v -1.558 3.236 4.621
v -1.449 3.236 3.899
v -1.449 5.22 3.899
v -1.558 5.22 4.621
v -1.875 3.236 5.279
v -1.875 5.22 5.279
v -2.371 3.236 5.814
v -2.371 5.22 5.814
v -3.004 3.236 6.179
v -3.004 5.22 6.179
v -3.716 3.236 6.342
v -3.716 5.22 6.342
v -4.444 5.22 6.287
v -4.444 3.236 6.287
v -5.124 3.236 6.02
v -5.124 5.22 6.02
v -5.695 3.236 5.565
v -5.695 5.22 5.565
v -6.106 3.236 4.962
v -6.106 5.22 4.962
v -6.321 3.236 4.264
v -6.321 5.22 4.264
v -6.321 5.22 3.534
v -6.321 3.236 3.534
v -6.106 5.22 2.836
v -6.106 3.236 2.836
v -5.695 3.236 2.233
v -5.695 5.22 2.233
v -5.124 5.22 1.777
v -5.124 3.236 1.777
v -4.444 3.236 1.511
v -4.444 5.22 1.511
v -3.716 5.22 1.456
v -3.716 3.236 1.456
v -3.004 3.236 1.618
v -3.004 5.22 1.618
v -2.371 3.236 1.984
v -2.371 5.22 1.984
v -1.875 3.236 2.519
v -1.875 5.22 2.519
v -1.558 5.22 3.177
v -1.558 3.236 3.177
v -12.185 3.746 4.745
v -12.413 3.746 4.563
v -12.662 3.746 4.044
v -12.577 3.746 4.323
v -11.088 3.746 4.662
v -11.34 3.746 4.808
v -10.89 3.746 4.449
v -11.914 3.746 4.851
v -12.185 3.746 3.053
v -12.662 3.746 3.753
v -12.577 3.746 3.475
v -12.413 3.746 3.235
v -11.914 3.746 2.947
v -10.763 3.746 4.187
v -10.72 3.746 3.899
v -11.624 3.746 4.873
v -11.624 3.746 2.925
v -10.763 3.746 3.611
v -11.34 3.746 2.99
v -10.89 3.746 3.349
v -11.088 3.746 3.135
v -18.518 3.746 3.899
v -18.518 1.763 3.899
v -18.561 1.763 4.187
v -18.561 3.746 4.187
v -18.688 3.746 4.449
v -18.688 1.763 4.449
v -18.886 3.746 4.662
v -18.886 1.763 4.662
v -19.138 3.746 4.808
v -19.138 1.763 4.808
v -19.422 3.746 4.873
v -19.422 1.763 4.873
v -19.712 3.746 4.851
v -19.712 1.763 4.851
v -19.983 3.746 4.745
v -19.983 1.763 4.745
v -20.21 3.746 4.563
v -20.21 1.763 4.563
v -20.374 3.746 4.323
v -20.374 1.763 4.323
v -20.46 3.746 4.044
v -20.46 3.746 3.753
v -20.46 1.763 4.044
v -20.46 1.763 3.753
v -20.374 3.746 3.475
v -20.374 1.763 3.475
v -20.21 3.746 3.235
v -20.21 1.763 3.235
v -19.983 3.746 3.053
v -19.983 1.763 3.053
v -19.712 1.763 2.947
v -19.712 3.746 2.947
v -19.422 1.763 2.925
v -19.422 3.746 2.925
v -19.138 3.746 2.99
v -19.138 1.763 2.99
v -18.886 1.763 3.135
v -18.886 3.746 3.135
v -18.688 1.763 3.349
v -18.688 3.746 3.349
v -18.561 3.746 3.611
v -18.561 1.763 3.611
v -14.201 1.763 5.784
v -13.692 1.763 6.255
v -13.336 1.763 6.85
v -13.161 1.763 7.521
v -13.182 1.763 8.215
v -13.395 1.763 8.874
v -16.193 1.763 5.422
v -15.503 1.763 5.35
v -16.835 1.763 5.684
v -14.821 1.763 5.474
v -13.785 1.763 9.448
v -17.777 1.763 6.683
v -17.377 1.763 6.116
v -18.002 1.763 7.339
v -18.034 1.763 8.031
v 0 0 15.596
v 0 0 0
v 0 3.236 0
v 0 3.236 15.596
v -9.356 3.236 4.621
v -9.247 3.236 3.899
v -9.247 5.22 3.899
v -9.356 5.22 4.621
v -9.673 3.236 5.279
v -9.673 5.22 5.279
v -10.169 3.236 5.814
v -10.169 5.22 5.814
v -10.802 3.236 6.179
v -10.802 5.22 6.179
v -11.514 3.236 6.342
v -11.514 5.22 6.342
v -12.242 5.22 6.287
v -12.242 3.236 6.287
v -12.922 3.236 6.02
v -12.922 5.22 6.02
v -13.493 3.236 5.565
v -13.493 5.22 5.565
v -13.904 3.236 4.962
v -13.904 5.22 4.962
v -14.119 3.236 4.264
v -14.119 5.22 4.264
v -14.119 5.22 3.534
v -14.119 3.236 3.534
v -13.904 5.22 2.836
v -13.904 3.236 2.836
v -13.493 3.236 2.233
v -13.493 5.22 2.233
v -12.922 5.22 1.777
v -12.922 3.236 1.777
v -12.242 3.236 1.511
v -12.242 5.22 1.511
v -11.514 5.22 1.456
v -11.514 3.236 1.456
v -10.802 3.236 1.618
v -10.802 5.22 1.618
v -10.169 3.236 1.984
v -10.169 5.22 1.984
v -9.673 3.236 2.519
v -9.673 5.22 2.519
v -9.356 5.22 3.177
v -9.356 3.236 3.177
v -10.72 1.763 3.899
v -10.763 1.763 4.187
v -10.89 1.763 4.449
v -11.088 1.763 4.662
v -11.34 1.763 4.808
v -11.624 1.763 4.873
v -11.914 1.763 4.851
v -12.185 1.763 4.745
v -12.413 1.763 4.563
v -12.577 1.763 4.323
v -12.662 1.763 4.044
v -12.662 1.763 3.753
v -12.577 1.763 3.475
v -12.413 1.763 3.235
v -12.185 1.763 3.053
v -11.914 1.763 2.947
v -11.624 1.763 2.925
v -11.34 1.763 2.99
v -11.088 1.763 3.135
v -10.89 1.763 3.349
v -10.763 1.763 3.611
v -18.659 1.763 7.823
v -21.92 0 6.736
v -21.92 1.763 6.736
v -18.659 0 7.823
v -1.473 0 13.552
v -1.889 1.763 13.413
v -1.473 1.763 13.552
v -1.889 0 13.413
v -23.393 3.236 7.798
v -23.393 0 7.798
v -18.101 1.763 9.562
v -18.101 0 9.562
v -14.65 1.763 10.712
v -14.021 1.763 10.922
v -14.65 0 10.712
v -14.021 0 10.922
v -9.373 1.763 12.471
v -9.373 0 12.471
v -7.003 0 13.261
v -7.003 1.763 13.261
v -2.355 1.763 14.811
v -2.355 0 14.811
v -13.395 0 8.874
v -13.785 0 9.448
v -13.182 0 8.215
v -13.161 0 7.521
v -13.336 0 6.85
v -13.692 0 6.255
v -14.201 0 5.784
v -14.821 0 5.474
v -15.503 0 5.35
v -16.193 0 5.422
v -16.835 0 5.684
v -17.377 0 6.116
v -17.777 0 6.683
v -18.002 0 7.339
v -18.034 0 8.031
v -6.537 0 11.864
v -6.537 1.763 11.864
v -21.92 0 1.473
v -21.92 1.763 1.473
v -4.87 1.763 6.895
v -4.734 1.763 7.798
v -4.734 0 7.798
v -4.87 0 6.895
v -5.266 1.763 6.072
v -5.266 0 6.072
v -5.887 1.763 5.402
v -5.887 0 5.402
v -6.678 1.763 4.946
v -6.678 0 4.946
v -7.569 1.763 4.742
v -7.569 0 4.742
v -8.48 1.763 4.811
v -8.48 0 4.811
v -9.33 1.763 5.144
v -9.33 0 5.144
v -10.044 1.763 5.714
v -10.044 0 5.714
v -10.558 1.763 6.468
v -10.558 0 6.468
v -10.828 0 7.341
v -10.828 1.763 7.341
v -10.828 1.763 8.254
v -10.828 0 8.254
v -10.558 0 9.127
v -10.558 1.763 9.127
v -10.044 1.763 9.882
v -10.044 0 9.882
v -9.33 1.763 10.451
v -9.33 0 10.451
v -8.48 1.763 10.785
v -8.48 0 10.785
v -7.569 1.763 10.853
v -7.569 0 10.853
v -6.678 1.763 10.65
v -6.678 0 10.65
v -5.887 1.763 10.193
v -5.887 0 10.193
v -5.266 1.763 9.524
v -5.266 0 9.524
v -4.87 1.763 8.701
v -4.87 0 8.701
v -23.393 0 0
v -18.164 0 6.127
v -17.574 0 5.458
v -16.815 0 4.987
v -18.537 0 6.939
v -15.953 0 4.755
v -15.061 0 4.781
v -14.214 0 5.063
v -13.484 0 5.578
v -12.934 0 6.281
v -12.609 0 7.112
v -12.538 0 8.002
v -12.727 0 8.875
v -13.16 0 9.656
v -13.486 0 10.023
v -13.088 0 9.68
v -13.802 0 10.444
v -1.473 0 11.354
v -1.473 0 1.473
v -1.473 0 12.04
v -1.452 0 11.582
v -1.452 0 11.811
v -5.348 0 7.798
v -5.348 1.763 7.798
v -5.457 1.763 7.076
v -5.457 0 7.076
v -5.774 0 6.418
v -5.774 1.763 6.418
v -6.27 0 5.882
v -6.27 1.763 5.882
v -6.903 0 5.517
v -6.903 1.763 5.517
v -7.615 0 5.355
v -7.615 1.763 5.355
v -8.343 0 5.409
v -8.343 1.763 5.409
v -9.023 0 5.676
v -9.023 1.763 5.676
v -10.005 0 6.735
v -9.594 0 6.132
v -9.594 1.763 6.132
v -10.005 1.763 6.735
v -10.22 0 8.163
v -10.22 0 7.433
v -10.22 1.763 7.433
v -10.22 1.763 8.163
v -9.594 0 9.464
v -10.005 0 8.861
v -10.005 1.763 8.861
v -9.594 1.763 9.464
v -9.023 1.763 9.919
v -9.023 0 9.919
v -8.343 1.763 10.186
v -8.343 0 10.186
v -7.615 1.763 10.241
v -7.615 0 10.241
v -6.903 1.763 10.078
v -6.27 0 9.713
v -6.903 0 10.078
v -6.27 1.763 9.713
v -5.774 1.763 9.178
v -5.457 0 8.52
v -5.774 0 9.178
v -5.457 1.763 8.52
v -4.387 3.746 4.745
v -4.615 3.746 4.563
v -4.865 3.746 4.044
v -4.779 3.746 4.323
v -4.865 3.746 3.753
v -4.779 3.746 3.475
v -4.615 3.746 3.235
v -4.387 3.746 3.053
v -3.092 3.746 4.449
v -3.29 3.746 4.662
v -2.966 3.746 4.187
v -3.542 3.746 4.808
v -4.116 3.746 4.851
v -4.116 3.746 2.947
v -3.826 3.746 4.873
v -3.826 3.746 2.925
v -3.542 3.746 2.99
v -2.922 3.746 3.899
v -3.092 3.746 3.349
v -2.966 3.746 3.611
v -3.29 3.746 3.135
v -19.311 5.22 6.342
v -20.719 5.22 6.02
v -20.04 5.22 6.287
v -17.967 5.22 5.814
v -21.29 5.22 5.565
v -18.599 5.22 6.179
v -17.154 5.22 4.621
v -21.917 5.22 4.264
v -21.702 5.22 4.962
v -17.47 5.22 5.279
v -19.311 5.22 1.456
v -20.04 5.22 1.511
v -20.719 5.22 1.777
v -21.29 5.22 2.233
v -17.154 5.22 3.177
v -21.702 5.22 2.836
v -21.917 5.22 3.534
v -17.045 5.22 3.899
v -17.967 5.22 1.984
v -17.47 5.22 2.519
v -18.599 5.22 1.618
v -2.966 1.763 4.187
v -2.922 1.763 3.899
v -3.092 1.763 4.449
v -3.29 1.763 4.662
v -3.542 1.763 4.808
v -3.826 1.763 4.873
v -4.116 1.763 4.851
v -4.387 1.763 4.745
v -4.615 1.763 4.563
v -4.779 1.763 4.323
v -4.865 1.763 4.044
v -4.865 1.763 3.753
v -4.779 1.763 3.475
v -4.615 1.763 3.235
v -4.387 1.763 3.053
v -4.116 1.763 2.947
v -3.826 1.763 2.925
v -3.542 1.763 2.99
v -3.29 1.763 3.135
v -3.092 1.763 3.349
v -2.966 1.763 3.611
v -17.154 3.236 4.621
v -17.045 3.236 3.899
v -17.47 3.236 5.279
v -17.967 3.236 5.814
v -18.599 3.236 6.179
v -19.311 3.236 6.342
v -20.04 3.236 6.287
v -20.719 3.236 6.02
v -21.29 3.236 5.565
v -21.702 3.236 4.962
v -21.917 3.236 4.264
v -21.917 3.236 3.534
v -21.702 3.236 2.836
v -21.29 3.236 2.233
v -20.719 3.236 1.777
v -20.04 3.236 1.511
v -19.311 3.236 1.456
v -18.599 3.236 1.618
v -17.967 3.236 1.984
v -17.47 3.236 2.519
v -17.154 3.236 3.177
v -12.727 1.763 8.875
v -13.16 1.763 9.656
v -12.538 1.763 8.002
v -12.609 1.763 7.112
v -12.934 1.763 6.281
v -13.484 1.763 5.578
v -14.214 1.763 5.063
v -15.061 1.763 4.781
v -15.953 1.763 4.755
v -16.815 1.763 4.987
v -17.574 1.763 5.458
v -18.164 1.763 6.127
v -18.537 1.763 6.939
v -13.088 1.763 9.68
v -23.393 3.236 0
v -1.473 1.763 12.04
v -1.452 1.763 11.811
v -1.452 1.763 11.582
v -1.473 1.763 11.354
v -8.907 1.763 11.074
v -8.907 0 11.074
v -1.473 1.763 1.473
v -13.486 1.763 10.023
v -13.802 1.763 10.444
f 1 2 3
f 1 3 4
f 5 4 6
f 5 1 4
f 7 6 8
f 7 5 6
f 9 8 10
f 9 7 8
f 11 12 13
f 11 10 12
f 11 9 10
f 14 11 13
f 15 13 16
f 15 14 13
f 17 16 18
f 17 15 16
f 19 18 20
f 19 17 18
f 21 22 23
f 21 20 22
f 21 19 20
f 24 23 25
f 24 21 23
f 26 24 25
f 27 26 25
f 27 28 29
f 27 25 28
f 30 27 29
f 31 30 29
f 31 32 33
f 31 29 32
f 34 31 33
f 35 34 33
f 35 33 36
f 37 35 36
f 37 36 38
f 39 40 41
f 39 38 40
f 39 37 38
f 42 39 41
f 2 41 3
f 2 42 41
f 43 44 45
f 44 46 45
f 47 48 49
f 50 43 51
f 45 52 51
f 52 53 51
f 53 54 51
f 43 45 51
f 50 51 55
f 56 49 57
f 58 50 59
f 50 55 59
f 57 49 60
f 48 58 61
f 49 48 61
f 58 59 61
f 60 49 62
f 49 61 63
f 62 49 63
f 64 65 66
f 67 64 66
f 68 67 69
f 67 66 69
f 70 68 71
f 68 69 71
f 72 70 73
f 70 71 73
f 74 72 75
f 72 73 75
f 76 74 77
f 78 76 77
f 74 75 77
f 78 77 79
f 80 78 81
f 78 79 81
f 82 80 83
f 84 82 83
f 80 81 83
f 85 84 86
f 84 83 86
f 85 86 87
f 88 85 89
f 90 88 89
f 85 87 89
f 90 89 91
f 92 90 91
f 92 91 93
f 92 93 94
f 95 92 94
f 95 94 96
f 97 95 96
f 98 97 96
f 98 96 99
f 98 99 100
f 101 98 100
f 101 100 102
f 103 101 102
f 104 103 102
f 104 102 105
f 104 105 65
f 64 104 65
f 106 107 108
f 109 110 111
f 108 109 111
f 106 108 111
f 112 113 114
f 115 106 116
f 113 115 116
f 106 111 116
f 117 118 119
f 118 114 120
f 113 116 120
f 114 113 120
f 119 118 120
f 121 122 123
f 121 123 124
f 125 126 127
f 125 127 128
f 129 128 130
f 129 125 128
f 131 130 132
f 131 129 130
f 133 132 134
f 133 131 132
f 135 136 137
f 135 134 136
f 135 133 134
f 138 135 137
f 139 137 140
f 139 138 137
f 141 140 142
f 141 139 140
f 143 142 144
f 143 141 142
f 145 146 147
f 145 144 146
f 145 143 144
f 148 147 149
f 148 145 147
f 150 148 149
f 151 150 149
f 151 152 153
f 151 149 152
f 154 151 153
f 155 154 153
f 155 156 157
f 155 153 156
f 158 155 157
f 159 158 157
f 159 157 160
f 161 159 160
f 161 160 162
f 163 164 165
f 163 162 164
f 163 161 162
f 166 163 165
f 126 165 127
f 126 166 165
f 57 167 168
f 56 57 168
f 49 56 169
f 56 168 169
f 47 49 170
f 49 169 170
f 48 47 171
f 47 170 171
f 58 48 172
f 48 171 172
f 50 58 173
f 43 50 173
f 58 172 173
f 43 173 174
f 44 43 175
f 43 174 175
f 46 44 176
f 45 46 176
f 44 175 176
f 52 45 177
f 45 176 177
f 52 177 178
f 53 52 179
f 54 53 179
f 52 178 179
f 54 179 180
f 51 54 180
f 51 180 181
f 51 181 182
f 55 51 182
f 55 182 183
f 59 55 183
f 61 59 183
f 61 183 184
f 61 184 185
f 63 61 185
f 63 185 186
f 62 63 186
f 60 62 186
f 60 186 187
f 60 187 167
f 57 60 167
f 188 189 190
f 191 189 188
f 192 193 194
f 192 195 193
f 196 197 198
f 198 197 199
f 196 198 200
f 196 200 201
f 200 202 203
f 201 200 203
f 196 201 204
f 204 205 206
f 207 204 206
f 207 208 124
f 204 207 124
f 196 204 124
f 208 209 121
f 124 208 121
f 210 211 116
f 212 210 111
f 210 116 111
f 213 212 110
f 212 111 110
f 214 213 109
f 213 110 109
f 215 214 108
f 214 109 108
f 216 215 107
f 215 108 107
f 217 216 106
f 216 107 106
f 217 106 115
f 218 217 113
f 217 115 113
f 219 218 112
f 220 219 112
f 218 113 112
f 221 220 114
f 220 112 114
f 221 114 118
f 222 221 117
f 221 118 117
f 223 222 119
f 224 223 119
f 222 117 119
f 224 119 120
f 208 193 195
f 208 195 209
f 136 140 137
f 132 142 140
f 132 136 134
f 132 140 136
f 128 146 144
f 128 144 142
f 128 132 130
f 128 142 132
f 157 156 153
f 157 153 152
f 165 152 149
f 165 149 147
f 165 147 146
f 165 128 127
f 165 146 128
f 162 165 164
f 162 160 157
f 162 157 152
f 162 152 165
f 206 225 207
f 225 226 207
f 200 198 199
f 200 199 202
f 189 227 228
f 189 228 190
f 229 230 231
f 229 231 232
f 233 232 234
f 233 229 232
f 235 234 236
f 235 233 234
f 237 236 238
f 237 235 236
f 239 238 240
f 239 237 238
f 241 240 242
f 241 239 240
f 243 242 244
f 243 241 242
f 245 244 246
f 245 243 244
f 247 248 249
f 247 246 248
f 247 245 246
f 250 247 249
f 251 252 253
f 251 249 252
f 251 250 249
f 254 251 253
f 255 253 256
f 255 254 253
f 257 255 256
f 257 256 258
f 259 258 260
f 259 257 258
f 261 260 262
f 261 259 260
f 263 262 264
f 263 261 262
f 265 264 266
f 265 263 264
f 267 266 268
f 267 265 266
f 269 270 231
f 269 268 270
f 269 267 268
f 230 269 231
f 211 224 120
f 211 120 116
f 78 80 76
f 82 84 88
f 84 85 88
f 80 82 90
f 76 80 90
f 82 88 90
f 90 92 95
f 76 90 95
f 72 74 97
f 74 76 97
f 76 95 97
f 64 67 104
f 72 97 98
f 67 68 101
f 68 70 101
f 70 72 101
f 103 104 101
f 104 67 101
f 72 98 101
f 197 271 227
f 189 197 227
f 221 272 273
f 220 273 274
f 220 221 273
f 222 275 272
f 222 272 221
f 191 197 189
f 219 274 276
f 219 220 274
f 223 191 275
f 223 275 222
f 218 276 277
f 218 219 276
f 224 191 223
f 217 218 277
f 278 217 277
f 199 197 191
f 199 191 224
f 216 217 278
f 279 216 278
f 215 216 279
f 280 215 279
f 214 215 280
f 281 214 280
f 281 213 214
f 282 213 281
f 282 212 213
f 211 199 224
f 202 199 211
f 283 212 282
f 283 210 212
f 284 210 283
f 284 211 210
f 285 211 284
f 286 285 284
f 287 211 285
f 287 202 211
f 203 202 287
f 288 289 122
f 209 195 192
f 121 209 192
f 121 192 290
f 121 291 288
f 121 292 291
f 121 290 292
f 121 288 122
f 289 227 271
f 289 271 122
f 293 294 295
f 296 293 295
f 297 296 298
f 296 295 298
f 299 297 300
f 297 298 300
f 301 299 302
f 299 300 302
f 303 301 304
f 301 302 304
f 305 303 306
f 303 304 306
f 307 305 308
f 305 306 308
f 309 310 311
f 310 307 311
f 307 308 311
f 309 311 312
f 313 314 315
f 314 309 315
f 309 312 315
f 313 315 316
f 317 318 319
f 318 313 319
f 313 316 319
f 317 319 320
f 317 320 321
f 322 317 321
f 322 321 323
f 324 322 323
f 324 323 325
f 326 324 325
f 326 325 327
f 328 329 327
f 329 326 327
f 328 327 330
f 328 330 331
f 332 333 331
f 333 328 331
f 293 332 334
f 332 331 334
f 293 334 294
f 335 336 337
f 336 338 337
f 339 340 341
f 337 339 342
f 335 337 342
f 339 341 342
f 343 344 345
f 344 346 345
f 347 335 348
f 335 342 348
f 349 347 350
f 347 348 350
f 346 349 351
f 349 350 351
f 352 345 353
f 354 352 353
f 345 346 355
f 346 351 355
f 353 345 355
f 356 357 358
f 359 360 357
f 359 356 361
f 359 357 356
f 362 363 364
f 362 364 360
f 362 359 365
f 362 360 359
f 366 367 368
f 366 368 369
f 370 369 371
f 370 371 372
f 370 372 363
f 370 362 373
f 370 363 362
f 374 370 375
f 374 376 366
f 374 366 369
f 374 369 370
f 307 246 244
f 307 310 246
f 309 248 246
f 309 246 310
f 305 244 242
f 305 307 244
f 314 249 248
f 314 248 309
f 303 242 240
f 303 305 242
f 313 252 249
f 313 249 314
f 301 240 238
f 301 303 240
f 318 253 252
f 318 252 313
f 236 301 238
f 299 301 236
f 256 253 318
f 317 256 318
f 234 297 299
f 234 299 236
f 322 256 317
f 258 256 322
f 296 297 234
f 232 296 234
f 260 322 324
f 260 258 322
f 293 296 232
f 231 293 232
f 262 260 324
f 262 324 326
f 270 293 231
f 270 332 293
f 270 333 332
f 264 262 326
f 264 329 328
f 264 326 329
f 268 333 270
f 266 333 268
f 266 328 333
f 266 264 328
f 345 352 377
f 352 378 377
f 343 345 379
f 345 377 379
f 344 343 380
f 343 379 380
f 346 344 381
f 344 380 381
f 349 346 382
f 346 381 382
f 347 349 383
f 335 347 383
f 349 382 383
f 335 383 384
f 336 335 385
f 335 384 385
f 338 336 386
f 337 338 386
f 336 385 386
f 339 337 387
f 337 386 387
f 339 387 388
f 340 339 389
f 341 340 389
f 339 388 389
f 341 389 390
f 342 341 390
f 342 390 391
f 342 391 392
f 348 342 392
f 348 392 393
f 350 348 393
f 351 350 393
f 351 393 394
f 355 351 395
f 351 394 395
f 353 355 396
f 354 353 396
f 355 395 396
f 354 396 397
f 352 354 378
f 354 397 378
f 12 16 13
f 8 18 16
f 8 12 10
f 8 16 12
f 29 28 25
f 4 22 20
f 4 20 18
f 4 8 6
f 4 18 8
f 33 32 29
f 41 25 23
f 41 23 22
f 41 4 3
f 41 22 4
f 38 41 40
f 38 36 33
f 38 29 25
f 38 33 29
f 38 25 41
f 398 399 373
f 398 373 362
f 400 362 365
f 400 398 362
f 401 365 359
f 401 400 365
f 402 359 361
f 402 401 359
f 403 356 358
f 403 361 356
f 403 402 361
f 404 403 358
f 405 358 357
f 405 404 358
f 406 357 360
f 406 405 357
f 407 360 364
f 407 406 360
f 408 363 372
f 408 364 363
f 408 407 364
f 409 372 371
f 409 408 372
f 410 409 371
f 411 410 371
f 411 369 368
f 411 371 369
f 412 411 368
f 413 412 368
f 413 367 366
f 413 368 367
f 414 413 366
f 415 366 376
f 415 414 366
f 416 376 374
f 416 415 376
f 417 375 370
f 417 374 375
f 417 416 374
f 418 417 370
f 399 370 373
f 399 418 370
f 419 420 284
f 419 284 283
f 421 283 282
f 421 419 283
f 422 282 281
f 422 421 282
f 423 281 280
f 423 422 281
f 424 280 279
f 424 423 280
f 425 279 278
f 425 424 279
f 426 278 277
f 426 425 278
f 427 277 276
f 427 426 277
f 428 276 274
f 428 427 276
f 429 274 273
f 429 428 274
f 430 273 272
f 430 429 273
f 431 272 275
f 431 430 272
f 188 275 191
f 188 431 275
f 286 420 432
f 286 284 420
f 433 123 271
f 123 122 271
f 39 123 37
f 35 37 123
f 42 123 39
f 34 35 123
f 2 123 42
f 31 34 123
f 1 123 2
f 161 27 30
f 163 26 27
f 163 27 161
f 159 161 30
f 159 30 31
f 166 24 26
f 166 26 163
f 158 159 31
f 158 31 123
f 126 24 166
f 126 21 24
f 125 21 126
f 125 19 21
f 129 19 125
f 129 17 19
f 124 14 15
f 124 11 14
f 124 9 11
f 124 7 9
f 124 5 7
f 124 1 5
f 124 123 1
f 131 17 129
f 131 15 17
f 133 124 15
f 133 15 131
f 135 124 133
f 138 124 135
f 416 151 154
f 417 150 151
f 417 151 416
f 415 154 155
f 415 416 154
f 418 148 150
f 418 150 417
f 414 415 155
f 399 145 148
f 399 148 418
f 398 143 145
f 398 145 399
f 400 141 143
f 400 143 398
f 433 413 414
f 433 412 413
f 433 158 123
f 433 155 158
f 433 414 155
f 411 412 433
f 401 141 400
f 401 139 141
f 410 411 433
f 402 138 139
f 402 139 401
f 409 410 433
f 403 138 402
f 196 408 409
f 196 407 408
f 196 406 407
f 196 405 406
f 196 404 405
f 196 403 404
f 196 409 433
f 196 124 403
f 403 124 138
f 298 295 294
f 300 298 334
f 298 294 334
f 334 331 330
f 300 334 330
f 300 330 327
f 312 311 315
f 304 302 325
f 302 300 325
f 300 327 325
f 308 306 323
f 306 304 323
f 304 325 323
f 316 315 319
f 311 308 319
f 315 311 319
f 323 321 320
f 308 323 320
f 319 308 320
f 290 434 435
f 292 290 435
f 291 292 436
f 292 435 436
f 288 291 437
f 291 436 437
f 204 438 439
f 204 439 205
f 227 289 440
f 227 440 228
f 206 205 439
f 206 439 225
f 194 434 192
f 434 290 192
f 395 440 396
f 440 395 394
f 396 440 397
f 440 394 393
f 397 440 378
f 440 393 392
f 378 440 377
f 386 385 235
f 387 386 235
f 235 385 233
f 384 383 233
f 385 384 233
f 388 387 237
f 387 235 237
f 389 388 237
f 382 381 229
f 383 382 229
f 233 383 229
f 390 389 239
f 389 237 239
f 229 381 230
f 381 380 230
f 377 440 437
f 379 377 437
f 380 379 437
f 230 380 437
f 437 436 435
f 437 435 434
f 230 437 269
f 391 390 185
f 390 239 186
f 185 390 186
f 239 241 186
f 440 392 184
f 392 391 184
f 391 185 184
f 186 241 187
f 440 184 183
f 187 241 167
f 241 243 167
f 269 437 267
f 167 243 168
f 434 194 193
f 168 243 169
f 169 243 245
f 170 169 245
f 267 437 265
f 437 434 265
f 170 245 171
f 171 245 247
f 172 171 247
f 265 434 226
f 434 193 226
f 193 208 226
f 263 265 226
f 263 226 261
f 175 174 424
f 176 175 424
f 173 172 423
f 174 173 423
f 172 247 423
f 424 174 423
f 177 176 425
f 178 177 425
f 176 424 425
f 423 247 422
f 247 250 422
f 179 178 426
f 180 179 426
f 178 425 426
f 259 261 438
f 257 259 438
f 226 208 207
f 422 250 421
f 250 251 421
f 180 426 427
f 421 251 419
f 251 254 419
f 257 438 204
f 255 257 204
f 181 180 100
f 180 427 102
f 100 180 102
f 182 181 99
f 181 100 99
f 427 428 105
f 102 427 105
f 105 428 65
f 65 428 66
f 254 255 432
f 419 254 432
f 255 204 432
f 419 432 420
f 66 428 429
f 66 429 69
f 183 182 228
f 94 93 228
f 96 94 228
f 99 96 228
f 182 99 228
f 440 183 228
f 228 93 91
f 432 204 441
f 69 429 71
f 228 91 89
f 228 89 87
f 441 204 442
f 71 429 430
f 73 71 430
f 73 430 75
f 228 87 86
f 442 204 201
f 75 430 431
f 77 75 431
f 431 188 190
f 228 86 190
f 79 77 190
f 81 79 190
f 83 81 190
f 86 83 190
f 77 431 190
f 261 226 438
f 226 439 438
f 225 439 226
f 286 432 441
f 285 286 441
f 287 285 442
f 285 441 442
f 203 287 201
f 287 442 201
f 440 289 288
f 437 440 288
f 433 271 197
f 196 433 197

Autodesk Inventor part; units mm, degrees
ref_plane "YZ Plane" through (0, 0, 0) normal (1, 0, 0) x (0, 1, 0)
ref_plane "XZ Plane" through (0, 0, 0) normal (0, 1, 0) x (-1, 0, 0)
ref_plane "XY Plane" through (0, 0, 0) normal (0, 0, 1) x (1, 0, 0)
sketch "Sketch1" plane through (0, 0, 0) normal (0, 1, 0) x (-1, 0, 0)
  line L0 (0, 0) -> (0, 15.5956)
  line L1 (0, 0) -> (23.3934, 0)
  line L2 (23.3934, 0) -> (23.3934, 7.7978)
  line L3 (23.3934, 7.7978) -> (0, 15.5956)
  dimension "d0" = 15.5956
  dimension "d1" = 23.3934
  dimension "d2" = 7.7978
extrude "Extrusion1" add sketch "Sketch1" along normal blind 3.236
sketch "Sketch2" plane through (0, 3.236, 0) normal (0, 1, 0) x (1, 0, 0)
  line L0 (-23.3934, -7.7978) -> (0, -15.5956) projected
  line L1 (-23.3934, 0) -> (-23.3934, -7.7978)
  line L2 (0, 0) -> (-23.3934, 0) projected
  line L3 (-23.3934, 0) -> (-23.3934, -7.7978)
  circle A0 centre (-19.4945, -3.8989) radius 2.4498
  line L4 (-23.3934, 0) -> (-19.4945, 0) construction
  line L5 (-19.4945, 0) -> (-19.4945, -3.8989) construction
  line L6 (-19.4945, -3.8989) -> (-23.3934, -3.8989) construction
  line L7 (-23.3934, -3.8989) -> (-23.3934, 0) construction
  dimension "d7" = 4.8997
  dimension "d17" = 3.8989
  dimension "d18" = 3.8989
extrude "Extrusion2" add sketch "Sketch2" along normal blind 1.9837
pattern_linear "Rectangular Pattern1" count 3 spacing 7.7978 along (1, 0, 0) of "Extrusion2"
sketch "Sketch3" plane through (0, 0, 0) normal (0, -1, 0) x (1, 0, 0)
  point P0 (0, 0)
shell "Shell1" thickness 1.4732 removed faces 1 at (-7.7978, 0, 7.7978)
sketch "Sketch4" plane through (-21.9202, 1.7628, 1.4732) normal (0, -1, 0) x (1, 0, 0)
  circle A0 centre (18.0213, 2.4257) radius 0.9766 construction
  circle A1 centre (10.2235, 2.4257) radius 0.9766 construction
  circle A2 centre (2.4257, 2.4257) radius 0.9766 construction
  line L0 (20.447, 12.0784) -> (20.447, 0) projected
  line L1 (0, 5.2628) -> (20.447, 12.0784) projected
  line L2 (0, 0) -> (0, 5.2628) construction
  line L3 (20.447, 0) -> (0, 0) construction
  circle A3 centre (18.0213, 2.4257) radius 2.4498 construction
  circle A4 centre (10.2235, 2.4257) radius 0.9766 construction
  circle A5 centre (10.2235, 2.4257) radius 2.4498 construction
  circle A6 centre (2.4257, 2.4257) radius 2.4498 construction
  line L4 (18.0213, 2.4257) -> (10.2235, 2.4257) construction
  line L5 (10.2235, 2.4257) -> (2.4257, 2.4257) construction
  line L6 (18.0213, 2.4257) -> (18.0213, 10.2235) construction
  line L7 (18.0213, 2.4257) -> (25.8191, 2.4257) construction
  line L8 (18.0213, 10.2235) -> (10.2235, 2.4257) construction
  circle A7 centre (14.1224, 6.3246) radius 3.064
  circle A8 centre (14.1224, 6.3246) radius 2.4498
  point P0 (21.9202, -1.4732)
  dimension "d14" = 7.7978
  dimension "d15" = 90
  dimension "d16" = 4.8997
extrude "Extrusion3" add sketch "Sketch4" along normal up to surface (1.7628 mm away)
pattern_linear "Rectangular Pattern2" count 2 spacing 7.7978 along (-1, 0, 0) of "Extrusion3"
sketch "Sketch5" plane through (-21.9202, 1.7628, 1.4732) normal (0, -1, 0) x (1, 0, 0)
  circle A0 centre (18.0213, 2.4257) radius 2.4498 construction
  line L0 (18.0213, 2.4257) -> (18.0213, 10.2235) construction
  line L1 (18.0213, 2.4257) -> (25.8191, 2.4257) construction
  circle A1 centre (18.0213, 10.2235) radius 2.4498 construction
  circle A2 centre (14.1224, 6.3246) radius 3.064 construction
  line L2 (15.6972, 9.4488) -> (13.6906, 15.4684) construction
  line L3 (13.6906, 15.4684) -> (19.2087, 14.4083) construction
  line L4 (19.2087, 14.4083) -> (20.3454, 10.9982) construction
  line L5 (21.9202, 14.1224) -> (7.2702, 9.2391) construction
  arc A3 (15.6972, 9.4488) -> (20.3454, 10.9982) centre (18.0213, 10.2235) ccw
  line L6 (20.3454, 10.9982) -> (19.2087, 14.4083)
  line L7 (15.6972, 9.4488) -> (13.6906, 15.4684)
  line L8 (13.6906, 15.4684) -> (19.2087, 14.4083)
  circle A4 centre (10.2235, 2.4257) radius 2.4498 construction
  line L9 (10.2235, 2.4257) -> (10.2235, 10.2235) construction
  line L10 (10.2235, 2.4257) -> (18.0213, 2.4257) construction
  circle A5 centre (10.2235, 10.2235) radius 2.4498 construction
  line L11 (13.4213, 8.3773) -> (11.5486, 13.9952) construction
  line L12 (11.5486, 13.9952) -> (1.2037, 10.5468) construction
  line L13 (1.2037, 10.5468) -> (2.2026, 7.5499) construction
  line L14 (3.8194, 8.0888) -> (-1.4732, 6.3246) construction
  line L15 (2.2026, 7.5499) -> (7.8994, 9.4488) construction
  arc A6 (13.1382, 9.2263) -> (11.9558, 8.4912) centre (14.1224, 6.3246) ccw construction
  arc A7 (13.1382, 9.2263) -> (11.9558, 8.4912) centre (14.1224, 6.3246) ccw
  arc A8 (7.8994, 9.4488) -> (11.9558, 8.4912) centre (10.2235, 10.2235) ccw
  line L16 (13.1382, 9.2263) -> (11.5486, 13.9952)
  line L17 (11.5486, 13.9952) -> (1.2037, 10.5468)
  line L18 (1.2037, 10.5468) -> (2.2026, 7.5499)
  line L19 (2.2026, 7.5499) -> (7.8994, 9.4488)
  point P0 (21.9202, -1.4732)
  dimension "d24" = 7.7978
  dimension "d25" = 90
  dimension "d28" = 7.7978
  dimension "d29" = 90
extrude "Extrusion4" cut sketch "Sketch5" along normal up to surface (1.7628 mm away)
properties part number "other diagonal piece" material "ABS Plastic"
